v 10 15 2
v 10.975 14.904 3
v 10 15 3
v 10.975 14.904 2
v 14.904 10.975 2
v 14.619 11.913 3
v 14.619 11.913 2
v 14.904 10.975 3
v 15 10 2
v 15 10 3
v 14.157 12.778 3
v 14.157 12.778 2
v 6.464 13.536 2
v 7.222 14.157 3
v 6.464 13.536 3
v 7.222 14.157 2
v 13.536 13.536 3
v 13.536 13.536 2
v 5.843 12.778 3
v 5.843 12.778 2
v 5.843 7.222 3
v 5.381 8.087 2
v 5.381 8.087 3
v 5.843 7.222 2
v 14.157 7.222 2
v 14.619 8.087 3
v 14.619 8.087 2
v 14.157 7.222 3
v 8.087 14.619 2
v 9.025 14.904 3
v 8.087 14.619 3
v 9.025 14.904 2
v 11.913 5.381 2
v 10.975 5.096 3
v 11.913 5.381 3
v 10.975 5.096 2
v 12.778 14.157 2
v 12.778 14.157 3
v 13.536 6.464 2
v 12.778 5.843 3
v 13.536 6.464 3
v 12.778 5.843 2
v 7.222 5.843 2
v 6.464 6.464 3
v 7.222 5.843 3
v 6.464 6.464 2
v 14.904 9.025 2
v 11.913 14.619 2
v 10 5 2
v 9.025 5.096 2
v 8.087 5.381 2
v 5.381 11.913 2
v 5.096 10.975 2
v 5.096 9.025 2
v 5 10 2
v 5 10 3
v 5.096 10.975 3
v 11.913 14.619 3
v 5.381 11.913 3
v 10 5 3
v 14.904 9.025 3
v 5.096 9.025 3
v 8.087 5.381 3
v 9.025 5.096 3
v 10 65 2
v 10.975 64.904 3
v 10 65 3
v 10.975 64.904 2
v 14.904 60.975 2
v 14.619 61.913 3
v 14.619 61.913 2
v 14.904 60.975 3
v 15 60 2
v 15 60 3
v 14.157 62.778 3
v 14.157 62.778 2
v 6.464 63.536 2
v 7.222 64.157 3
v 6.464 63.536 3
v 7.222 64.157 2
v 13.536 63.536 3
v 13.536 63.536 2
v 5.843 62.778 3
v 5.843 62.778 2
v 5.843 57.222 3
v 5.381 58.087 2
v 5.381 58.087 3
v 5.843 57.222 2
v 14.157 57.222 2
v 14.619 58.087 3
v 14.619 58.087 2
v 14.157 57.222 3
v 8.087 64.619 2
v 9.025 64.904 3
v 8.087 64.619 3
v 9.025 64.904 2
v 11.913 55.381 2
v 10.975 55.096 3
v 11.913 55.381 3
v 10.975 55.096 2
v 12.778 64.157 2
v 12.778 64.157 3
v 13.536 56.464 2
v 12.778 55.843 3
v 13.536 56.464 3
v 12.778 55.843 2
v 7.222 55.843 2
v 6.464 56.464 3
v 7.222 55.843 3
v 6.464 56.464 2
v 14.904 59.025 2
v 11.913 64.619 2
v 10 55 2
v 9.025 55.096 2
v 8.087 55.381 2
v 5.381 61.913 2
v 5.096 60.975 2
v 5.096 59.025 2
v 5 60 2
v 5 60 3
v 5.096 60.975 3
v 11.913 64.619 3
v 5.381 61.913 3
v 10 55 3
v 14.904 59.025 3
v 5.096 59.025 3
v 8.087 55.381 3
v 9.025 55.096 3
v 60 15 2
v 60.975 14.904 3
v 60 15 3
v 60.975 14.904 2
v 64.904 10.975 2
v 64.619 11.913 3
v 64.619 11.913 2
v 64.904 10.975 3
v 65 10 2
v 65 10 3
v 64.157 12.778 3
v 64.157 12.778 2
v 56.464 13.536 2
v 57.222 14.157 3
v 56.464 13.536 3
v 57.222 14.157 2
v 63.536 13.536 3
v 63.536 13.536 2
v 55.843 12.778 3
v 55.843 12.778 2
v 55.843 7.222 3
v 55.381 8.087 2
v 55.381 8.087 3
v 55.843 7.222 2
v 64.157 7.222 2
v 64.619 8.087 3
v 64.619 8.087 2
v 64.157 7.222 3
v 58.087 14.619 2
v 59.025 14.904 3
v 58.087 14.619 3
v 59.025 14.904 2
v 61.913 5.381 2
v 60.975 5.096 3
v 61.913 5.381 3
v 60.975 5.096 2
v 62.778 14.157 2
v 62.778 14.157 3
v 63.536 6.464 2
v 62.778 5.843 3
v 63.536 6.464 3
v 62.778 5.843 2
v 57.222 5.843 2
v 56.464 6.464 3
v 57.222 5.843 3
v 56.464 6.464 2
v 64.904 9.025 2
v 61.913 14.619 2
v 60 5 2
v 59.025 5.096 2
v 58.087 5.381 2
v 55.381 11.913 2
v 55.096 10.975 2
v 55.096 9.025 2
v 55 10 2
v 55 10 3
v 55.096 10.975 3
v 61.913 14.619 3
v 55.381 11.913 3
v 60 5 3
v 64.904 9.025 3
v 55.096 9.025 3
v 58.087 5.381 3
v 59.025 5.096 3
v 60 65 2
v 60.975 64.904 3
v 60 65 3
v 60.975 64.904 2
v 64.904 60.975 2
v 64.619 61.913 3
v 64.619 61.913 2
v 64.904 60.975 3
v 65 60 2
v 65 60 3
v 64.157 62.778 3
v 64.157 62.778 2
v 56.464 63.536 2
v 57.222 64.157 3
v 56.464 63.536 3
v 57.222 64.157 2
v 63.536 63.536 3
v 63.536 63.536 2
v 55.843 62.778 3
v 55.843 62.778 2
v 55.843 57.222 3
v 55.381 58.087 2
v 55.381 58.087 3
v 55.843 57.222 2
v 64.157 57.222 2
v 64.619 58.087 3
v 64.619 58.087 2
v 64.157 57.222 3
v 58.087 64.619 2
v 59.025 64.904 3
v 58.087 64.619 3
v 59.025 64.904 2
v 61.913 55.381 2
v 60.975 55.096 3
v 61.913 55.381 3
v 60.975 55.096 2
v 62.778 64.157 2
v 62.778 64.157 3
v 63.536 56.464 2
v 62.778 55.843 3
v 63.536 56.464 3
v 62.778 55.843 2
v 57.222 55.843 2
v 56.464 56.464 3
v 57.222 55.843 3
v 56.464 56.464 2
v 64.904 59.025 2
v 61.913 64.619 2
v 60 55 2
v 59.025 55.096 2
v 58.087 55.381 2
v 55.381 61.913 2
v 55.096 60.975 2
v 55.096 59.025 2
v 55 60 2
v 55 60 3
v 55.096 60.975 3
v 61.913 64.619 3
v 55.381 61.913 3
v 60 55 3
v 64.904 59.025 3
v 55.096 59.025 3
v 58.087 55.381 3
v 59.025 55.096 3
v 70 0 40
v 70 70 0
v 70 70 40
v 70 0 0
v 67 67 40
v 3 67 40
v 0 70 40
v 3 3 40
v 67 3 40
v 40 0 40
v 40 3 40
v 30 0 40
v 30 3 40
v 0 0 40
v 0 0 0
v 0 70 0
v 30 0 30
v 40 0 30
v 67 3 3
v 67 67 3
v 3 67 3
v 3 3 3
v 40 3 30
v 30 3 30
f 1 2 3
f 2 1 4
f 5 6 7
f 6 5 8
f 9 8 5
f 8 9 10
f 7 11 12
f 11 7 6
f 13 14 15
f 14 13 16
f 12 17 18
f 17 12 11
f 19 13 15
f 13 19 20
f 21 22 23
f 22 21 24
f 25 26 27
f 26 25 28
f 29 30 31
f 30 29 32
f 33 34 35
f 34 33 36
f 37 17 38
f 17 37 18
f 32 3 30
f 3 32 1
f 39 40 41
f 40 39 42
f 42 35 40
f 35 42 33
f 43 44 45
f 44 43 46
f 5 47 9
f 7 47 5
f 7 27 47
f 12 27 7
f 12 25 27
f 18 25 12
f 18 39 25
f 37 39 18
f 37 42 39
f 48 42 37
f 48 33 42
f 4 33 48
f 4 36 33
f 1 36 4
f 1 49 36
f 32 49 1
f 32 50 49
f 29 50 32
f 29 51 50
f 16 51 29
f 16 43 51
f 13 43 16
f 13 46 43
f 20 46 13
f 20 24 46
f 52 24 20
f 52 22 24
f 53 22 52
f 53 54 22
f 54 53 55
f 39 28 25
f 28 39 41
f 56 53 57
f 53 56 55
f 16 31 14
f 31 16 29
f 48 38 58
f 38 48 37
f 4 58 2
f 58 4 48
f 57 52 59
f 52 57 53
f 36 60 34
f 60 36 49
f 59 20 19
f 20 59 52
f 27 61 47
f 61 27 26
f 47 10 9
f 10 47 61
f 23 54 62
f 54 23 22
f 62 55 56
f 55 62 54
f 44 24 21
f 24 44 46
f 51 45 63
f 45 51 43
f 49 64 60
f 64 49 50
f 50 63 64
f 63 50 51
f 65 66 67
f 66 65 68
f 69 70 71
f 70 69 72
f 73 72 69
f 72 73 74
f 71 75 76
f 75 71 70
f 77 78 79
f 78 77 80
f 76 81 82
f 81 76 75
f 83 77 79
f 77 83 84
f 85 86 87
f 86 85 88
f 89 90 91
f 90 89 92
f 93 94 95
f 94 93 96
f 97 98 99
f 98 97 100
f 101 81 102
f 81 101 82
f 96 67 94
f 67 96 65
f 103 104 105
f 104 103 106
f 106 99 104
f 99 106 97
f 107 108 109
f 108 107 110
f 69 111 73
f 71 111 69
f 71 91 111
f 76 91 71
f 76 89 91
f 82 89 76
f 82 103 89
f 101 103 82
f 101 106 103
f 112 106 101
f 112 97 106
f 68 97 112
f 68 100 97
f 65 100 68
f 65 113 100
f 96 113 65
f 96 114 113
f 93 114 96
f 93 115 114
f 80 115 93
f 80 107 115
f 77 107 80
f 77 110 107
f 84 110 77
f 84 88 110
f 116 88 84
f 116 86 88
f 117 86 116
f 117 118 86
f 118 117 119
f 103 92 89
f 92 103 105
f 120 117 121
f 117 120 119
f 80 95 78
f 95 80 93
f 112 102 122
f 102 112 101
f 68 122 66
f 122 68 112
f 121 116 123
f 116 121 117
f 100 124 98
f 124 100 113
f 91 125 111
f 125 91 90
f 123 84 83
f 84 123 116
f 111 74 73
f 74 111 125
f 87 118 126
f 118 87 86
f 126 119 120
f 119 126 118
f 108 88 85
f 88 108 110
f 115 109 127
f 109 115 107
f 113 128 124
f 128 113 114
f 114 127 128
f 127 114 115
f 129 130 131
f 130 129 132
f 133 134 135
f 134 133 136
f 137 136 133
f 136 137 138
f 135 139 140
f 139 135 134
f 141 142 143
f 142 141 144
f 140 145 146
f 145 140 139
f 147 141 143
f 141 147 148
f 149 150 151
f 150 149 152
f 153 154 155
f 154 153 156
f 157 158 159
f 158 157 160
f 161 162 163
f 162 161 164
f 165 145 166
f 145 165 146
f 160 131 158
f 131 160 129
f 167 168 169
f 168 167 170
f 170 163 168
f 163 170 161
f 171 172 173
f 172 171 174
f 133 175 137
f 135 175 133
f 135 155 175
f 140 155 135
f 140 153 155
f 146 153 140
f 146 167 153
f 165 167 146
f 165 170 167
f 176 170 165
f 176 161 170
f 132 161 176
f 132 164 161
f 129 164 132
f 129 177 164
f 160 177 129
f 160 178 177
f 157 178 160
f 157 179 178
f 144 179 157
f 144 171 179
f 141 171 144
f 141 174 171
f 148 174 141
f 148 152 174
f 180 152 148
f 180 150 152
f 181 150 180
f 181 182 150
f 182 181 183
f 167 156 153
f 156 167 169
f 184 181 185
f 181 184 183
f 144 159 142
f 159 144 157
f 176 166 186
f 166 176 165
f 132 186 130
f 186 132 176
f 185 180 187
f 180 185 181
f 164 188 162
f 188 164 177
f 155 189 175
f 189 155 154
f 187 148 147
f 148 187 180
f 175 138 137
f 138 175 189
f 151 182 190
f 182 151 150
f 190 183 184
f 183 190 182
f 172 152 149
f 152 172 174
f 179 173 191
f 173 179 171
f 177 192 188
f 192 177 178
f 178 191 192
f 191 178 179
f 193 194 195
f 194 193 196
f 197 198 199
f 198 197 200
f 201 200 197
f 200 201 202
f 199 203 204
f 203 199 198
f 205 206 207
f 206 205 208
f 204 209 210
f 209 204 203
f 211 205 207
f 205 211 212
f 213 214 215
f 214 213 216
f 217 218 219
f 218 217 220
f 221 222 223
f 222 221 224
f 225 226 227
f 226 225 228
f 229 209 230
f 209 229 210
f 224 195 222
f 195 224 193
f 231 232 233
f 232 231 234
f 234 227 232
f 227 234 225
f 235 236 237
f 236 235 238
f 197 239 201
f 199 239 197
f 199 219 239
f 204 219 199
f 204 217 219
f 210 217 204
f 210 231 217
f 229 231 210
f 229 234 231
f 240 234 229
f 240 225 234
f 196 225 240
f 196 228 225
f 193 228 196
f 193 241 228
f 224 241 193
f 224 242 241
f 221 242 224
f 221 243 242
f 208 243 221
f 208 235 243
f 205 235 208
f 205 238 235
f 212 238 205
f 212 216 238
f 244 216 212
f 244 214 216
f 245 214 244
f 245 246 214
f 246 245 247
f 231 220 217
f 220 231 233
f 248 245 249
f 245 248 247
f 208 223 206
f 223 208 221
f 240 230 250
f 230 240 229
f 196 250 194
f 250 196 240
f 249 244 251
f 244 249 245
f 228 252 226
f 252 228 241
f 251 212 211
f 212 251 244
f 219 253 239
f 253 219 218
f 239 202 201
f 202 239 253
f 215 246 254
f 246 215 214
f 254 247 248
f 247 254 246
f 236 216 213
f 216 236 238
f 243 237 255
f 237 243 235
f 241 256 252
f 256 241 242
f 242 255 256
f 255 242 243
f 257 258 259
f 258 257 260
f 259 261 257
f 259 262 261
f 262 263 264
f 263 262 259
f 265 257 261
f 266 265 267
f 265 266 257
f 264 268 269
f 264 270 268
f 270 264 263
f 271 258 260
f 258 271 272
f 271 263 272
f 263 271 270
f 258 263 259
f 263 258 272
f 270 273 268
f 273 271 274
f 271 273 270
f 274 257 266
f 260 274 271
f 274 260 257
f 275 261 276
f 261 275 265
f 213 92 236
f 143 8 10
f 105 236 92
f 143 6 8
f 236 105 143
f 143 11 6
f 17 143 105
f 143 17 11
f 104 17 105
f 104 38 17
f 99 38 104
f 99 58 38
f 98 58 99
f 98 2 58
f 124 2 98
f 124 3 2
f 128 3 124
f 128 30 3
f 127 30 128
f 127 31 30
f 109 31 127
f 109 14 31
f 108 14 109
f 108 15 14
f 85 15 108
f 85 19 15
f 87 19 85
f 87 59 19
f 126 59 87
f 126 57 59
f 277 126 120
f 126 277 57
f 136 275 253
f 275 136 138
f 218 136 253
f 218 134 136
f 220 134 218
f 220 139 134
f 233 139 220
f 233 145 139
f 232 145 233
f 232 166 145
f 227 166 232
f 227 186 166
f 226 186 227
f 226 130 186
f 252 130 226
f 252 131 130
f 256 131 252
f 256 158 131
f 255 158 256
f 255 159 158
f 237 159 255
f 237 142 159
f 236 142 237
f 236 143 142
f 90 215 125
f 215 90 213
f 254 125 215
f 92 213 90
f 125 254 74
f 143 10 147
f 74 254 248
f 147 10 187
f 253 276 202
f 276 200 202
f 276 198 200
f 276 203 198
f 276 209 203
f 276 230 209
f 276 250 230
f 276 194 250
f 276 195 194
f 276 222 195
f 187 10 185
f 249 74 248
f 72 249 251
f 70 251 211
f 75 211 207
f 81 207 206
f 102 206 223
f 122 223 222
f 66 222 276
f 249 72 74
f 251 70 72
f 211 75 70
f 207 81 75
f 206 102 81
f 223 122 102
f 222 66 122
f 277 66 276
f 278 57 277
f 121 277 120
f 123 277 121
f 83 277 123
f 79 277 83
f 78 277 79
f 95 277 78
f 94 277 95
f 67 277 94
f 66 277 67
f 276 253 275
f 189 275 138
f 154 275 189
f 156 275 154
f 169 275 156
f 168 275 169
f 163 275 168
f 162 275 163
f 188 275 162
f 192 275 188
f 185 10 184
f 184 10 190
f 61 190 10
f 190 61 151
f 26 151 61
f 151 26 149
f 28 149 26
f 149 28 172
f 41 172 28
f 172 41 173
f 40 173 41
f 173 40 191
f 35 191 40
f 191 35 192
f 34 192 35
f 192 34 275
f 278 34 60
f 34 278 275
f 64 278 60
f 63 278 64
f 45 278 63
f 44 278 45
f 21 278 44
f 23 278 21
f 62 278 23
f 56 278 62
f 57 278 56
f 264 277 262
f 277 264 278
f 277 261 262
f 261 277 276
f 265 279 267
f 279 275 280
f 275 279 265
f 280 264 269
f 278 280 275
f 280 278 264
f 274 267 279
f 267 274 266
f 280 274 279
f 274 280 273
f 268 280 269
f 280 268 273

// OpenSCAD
$fn = 32;

// ----------------------------------------------------------------------
// Enclosure box: both enclosure
// ----------------------------------------------------------------------

// --- parameters (mm) ---
box_l = 70;               // outer length, X
box_w = 70;               // outer width, Y
box_h = 40;               // outer height
wall_t = 3;               // wall thickness
boss_r = 5;               // corner boss radius
hole_r = 2;               // boss screw hole radius
boss_in = 10;             // boss inset from the corners
notch_w = 10;             // cable notch width
notch_h = 10;             // cable notch height

inner_h = box_h - wall_t;  // cavity depth
boss_h = inner_h - 2;  // corner boss height

difference() {
  cube([box_l, box_w, box_h]);
  translate([wall_t, wall_t, wall_t])
    cube([box_l - 2 * wall_t, box_w - 2 * wall_t, box_h]);
  for (sx = [0, 1], sy = [0, 1])
    translate([sx ? box_l - boss_in : boss_in,
               sy ? box_w - boss_in : boss_in, wall_t - 1]) {
      cylinder(r = boss_r, h = boss_h);
      translate([0, 0, boss_h - 4])
        cylinder(r = hole_r, h = 5);
    }
  translate([box_l / 2 - notch_w / 2, -1, box_h - notch_h])
    cube([notch_w, wall_t + 2, notch_h + 1]);
}
